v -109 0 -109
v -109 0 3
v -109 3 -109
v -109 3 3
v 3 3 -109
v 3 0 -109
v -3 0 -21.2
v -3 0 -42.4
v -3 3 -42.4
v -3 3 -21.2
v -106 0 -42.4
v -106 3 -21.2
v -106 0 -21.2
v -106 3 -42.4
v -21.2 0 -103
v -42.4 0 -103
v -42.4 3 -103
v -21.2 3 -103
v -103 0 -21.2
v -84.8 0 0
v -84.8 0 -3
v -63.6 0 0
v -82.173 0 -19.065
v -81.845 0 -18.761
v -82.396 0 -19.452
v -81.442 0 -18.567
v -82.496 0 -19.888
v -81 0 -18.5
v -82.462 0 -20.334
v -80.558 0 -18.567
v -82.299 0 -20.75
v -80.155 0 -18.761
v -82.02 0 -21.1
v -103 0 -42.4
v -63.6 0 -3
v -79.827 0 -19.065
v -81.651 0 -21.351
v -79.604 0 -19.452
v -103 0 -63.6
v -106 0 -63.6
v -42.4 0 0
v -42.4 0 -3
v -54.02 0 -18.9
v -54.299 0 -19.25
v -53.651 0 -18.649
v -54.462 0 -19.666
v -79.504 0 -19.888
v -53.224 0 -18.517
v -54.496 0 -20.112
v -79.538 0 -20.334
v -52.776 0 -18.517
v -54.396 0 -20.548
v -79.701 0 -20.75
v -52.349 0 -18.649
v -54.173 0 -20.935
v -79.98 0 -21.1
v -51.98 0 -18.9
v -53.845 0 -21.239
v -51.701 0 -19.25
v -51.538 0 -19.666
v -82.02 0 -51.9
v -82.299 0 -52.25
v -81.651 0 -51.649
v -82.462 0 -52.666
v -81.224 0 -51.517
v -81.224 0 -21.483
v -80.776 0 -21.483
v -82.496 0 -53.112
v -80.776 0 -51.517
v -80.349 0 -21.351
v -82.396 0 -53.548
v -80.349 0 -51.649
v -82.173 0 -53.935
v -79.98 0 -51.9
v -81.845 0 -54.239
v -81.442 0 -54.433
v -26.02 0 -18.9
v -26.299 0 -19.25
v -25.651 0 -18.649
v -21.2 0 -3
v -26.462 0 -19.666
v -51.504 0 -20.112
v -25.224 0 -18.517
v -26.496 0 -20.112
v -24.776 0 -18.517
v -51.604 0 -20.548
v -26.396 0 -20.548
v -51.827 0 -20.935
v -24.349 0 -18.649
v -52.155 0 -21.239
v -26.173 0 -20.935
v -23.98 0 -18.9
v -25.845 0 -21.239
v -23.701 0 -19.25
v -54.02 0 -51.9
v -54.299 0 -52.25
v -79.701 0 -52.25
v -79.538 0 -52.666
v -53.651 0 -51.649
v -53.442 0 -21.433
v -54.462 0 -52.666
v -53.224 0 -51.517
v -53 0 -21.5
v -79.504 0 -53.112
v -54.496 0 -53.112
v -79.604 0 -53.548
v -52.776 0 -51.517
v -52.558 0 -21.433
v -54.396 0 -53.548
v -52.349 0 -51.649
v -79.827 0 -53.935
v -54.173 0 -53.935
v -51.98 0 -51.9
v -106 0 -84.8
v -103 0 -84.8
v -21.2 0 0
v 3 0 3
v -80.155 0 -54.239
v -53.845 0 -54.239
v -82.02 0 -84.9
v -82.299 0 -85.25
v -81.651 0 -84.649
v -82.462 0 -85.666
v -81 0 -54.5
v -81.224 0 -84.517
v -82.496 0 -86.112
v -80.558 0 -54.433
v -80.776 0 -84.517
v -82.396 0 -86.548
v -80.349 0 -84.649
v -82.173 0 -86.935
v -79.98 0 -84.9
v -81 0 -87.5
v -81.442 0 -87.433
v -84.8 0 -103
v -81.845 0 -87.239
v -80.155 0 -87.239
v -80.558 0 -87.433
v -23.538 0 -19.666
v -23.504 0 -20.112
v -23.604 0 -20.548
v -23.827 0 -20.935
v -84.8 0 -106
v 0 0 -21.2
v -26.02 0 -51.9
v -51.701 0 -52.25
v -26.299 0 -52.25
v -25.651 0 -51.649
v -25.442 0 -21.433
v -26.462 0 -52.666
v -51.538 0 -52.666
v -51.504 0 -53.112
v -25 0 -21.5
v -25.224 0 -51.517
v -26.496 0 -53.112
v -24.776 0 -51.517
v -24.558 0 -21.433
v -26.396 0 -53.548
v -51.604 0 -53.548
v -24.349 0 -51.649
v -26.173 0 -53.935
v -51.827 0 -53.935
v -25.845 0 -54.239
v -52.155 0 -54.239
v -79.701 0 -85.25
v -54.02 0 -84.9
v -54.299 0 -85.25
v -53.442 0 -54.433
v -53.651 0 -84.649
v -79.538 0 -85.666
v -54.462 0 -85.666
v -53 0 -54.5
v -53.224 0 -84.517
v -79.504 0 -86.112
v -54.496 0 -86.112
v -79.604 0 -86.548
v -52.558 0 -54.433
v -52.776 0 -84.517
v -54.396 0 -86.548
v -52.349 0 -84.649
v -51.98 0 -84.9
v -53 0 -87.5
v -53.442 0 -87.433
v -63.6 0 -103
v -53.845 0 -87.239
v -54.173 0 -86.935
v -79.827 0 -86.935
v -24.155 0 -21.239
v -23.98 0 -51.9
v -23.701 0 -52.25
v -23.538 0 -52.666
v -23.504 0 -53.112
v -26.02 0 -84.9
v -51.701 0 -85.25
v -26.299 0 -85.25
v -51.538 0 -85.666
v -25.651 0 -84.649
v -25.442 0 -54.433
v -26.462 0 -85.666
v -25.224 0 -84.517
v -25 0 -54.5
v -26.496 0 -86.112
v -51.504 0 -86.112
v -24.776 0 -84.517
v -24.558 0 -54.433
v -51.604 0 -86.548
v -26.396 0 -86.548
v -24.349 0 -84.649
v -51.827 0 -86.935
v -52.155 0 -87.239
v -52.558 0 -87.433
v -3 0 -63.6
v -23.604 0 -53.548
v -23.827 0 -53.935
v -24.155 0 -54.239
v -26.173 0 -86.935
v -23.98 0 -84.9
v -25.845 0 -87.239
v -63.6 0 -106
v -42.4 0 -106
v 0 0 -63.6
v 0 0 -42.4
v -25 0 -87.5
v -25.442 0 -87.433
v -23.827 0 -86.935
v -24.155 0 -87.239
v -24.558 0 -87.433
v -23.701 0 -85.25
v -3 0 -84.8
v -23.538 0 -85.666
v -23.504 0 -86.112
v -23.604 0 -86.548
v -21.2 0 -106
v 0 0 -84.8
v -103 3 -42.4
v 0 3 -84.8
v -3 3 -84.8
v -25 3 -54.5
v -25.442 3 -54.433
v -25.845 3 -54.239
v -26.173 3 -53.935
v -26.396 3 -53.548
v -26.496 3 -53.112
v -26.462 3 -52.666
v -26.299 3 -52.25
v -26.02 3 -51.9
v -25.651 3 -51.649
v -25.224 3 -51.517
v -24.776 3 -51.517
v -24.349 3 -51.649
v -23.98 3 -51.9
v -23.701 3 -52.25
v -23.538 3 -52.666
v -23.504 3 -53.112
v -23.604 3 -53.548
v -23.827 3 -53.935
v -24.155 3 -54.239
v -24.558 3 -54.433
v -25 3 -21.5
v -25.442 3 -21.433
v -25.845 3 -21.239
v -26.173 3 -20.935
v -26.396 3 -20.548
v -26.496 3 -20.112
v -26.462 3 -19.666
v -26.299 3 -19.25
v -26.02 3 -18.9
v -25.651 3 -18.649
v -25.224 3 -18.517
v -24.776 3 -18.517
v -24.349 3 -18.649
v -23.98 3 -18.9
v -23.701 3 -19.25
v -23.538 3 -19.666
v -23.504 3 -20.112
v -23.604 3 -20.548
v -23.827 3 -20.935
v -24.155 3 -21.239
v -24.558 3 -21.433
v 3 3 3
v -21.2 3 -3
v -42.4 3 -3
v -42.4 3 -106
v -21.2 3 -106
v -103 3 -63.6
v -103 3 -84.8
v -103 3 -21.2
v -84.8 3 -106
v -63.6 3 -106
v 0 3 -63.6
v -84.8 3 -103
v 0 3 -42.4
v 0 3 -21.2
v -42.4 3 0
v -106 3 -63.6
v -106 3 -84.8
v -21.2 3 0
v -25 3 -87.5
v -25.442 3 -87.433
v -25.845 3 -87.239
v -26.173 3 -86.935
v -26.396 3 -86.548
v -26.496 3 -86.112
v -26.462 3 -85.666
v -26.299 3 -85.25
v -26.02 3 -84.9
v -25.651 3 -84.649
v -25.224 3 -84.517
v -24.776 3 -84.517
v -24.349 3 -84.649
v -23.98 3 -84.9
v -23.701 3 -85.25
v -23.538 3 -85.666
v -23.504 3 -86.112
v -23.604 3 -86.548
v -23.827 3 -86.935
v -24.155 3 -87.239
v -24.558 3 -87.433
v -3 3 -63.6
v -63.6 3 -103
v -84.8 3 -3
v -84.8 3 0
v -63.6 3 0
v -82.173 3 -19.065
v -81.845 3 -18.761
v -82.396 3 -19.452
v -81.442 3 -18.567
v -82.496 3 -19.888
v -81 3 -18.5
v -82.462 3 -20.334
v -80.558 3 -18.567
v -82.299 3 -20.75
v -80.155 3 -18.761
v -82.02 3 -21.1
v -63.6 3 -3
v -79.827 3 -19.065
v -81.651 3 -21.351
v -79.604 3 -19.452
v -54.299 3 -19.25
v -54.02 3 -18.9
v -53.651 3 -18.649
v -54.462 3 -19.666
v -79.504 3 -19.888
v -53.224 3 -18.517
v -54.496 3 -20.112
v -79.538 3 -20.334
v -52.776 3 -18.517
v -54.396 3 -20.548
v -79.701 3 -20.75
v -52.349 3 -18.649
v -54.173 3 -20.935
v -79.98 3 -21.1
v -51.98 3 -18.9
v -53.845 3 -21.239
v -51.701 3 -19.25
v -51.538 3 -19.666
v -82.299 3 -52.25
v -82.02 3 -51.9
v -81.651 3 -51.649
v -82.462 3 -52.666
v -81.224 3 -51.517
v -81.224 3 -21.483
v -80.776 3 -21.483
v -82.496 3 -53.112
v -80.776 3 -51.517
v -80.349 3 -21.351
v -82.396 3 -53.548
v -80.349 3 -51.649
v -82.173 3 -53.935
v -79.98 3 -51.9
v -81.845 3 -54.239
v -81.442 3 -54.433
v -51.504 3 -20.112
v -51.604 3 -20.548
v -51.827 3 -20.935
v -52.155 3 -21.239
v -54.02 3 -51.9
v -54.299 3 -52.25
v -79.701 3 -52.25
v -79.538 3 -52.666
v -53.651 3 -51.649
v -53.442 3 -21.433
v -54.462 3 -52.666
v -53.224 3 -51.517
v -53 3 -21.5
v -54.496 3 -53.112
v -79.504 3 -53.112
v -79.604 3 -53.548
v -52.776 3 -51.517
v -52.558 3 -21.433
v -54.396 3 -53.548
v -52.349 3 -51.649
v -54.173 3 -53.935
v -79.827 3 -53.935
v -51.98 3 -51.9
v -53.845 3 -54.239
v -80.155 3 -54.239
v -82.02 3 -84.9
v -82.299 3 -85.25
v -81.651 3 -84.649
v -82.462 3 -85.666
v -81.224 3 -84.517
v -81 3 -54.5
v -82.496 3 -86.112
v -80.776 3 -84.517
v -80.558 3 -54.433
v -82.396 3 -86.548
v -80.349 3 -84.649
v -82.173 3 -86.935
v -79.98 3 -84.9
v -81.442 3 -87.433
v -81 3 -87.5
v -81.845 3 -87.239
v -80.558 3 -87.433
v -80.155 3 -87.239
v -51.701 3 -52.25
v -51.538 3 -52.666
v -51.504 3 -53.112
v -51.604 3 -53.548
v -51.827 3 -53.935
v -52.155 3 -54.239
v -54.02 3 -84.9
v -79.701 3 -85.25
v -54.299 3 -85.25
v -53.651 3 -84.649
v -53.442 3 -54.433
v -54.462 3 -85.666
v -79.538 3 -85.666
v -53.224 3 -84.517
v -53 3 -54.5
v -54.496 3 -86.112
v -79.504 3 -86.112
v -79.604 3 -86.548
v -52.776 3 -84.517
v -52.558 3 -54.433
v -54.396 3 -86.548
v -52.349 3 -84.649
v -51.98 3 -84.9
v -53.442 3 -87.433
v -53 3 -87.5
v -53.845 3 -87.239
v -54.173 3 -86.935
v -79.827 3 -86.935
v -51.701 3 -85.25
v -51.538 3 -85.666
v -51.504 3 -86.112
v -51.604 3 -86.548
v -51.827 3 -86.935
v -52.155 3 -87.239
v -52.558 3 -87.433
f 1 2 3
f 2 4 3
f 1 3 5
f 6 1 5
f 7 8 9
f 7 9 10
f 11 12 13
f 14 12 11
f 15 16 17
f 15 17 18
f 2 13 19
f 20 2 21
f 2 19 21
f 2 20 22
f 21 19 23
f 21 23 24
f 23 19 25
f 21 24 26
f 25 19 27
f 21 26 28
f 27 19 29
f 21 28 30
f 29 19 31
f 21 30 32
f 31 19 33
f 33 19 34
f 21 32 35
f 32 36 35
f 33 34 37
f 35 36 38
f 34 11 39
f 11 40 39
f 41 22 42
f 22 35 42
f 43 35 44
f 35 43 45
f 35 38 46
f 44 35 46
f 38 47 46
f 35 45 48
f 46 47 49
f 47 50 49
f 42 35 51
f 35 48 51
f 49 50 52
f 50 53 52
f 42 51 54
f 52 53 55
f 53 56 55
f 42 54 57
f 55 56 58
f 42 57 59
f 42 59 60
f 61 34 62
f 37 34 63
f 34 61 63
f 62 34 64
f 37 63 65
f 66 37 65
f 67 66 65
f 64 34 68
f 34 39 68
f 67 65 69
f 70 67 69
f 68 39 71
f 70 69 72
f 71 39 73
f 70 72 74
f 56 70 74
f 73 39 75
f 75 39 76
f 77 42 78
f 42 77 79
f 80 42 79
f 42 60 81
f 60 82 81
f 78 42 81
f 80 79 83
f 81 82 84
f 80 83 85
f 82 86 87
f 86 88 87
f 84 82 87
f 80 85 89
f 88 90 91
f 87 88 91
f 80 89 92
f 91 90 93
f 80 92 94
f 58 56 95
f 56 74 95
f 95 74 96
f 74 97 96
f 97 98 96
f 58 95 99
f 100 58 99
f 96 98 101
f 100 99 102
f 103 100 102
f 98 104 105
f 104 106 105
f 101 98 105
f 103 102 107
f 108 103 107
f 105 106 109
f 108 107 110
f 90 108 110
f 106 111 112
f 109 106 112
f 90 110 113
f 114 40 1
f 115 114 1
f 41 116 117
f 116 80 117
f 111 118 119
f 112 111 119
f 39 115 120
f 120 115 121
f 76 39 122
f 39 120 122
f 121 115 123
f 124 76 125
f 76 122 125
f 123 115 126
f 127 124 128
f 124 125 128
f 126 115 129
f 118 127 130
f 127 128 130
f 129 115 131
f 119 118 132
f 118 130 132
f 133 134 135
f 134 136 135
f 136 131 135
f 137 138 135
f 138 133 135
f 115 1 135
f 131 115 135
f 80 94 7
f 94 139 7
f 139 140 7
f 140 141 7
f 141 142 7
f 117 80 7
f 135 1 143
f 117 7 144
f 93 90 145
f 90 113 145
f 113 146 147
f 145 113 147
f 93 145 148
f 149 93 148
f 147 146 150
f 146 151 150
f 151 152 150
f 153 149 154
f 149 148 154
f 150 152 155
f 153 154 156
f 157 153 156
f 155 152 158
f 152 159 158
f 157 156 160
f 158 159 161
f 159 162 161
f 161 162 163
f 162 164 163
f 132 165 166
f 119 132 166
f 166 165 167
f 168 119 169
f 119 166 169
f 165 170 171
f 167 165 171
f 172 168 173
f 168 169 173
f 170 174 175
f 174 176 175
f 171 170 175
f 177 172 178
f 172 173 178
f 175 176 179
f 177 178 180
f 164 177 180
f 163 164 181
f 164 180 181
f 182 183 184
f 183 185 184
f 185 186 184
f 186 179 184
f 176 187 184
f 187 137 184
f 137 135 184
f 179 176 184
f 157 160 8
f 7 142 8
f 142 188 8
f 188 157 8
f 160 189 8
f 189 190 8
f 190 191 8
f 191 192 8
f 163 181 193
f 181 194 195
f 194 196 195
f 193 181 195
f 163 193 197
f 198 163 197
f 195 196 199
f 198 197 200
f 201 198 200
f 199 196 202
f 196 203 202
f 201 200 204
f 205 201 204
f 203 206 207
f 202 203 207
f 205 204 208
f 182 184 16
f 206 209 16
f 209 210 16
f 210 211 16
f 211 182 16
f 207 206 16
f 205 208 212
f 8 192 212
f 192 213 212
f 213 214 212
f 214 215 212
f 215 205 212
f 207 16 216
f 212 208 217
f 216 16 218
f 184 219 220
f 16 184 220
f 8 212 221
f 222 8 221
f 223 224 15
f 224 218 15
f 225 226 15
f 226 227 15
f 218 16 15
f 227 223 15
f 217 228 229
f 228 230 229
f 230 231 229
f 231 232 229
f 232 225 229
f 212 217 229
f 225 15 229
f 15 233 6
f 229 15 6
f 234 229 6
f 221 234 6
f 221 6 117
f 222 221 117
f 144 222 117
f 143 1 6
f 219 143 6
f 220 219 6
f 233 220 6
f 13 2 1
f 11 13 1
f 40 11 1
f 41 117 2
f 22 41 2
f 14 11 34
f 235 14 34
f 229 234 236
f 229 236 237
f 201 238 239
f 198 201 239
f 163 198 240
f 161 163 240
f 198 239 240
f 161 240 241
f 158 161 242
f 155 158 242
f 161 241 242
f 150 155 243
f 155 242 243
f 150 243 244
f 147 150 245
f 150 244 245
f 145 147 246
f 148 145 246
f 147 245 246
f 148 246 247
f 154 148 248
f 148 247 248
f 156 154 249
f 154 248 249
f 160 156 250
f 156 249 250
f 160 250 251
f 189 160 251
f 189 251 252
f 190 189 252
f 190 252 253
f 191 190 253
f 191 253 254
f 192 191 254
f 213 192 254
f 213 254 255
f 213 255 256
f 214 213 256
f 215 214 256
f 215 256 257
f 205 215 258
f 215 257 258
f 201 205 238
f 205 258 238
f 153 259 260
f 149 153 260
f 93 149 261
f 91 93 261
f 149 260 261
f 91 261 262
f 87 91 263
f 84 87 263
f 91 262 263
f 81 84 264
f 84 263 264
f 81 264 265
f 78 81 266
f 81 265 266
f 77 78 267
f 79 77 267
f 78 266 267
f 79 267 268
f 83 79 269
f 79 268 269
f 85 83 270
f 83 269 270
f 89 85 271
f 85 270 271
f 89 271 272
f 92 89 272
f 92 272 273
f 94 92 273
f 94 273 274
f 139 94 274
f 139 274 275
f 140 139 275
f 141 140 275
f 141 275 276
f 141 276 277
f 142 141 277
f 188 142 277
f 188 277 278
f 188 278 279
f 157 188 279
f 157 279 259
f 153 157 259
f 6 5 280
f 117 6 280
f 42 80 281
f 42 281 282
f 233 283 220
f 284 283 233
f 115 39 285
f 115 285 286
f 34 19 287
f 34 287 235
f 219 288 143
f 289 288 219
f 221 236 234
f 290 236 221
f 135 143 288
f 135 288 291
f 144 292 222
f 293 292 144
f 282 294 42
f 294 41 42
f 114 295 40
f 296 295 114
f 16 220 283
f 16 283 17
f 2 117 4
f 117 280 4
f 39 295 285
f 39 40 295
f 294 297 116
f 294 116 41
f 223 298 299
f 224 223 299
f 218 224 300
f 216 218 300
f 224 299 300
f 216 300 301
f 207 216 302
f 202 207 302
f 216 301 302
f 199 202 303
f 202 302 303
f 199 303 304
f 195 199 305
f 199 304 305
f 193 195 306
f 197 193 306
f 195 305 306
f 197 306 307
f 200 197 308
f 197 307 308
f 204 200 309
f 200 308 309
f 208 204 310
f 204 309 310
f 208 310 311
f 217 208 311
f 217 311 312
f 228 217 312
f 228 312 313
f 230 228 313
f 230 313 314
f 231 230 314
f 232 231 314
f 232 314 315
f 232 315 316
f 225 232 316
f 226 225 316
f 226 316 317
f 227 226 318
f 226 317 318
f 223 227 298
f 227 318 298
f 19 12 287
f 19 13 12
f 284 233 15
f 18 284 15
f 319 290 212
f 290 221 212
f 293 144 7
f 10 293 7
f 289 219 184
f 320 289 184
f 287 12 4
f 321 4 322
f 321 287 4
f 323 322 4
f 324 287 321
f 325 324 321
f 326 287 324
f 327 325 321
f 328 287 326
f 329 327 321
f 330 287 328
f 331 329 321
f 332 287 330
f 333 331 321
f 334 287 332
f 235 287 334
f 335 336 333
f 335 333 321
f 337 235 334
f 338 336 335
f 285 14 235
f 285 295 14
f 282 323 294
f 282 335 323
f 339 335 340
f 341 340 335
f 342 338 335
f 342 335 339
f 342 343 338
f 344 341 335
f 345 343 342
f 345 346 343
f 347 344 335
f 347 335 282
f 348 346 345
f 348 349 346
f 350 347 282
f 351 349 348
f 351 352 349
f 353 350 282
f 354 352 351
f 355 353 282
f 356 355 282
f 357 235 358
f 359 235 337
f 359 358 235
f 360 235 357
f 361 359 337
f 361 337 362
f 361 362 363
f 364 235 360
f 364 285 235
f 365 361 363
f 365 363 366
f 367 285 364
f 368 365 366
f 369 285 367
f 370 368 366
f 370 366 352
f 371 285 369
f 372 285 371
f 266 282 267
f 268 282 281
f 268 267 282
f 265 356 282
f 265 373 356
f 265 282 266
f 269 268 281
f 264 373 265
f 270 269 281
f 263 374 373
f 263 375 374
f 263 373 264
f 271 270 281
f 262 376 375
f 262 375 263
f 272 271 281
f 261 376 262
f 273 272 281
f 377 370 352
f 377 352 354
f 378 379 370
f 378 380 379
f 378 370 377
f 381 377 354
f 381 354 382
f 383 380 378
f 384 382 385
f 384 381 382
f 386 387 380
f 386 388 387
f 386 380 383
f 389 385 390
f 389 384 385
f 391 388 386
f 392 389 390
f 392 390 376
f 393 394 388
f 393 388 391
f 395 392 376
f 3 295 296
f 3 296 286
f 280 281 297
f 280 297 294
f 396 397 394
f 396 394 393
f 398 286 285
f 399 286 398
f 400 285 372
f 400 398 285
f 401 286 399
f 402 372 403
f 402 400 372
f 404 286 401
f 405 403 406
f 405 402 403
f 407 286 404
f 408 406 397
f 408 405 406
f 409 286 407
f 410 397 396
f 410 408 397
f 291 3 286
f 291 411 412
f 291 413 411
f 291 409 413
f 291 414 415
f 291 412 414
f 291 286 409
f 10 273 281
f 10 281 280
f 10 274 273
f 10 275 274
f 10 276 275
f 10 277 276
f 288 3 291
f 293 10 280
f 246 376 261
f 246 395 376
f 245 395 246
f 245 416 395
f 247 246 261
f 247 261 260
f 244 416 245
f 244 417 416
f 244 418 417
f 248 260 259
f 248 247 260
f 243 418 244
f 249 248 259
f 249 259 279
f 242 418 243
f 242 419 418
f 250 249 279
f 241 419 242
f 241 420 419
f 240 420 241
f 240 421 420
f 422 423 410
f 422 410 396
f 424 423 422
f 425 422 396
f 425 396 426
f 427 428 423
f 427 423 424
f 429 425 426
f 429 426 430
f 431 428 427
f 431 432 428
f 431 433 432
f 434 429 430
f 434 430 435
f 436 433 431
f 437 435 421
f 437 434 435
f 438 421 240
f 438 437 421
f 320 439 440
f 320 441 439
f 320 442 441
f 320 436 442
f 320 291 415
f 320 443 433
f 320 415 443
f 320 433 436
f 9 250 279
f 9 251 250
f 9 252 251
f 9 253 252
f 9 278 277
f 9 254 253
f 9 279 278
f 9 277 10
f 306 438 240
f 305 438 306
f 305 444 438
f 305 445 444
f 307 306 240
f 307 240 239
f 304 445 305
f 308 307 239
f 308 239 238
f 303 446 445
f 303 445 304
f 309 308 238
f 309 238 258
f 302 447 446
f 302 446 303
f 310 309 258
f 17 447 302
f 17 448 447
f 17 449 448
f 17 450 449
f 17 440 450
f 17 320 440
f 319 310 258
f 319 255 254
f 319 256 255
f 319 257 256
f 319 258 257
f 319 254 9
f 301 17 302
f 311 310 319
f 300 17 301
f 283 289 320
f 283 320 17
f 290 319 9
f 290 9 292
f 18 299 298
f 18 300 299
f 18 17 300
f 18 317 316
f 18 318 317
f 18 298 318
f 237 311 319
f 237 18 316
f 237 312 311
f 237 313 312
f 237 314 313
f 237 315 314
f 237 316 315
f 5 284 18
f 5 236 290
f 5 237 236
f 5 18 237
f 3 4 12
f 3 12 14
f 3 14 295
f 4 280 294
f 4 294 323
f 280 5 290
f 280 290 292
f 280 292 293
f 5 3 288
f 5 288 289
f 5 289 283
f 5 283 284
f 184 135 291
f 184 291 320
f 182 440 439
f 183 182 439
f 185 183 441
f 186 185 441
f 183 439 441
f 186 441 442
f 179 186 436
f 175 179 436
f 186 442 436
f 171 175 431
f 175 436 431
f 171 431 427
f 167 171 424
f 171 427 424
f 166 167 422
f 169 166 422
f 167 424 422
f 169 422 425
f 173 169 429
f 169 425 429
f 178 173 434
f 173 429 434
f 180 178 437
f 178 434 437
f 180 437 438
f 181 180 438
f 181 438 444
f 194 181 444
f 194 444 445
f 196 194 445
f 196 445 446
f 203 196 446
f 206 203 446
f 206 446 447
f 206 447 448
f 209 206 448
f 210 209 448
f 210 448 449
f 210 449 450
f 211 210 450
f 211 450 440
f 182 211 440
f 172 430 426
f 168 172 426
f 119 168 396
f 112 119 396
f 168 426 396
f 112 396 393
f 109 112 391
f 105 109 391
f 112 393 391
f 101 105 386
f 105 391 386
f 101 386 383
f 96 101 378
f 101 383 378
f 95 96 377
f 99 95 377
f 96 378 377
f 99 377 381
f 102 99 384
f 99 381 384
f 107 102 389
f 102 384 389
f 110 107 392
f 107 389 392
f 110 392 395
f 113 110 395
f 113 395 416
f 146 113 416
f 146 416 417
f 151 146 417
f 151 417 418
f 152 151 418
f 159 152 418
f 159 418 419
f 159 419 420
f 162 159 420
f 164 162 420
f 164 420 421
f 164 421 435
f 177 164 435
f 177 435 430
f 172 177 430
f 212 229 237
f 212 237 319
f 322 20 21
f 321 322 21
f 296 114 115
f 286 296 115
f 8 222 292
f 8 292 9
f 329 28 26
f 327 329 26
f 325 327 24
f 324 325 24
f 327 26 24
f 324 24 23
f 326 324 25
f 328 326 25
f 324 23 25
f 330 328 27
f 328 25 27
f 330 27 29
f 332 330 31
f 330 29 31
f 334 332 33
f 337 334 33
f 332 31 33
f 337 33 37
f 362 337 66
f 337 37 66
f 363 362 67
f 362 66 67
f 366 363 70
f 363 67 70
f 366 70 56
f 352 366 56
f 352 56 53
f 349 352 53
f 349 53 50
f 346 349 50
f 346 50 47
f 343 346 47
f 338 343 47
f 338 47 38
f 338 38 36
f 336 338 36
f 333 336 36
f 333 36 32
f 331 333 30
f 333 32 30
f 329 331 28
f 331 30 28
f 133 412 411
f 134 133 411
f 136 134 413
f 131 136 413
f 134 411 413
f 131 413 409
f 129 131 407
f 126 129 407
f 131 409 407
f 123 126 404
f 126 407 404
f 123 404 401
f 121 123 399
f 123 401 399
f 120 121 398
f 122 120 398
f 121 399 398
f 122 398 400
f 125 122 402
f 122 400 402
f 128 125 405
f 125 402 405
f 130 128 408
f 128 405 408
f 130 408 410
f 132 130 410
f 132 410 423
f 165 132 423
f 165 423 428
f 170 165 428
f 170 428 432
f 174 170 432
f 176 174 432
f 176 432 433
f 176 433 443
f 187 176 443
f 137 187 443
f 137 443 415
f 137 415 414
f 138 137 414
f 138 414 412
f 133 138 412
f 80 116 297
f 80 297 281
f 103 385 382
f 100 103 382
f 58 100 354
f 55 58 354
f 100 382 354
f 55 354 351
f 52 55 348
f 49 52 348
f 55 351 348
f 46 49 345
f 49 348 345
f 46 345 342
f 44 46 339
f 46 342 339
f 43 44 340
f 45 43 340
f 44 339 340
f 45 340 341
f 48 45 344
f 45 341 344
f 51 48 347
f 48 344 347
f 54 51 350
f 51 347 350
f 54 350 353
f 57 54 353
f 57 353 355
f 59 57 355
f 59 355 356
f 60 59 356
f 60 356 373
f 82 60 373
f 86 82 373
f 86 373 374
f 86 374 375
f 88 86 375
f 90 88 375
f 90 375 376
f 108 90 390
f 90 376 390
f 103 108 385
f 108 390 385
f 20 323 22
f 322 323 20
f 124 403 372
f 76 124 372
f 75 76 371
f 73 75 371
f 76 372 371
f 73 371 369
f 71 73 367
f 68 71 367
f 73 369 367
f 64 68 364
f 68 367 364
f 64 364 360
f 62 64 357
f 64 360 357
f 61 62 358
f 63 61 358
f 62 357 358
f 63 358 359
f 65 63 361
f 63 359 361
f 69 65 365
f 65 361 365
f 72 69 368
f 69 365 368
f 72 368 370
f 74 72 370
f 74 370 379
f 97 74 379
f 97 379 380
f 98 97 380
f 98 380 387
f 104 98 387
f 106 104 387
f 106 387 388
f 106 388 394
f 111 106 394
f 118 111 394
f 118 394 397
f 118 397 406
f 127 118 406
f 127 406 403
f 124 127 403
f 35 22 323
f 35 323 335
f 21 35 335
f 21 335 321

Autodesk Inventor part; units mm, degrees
ref_plane "YZ Plane" through (0, 0, 0) normal (1, 0, 0) x (0, 1, 0)
ref_plane "XZ Plane" through (0, 0, 0) normal (0, 1, 0) x (-1, 0, 0)
ref_plane "XY Plane" through (0, 0, 0) normal (0, 0, 1) x (1, 0, 0)
sketch "Sketch1" plane through (0, 0, 0) normal (0, 1, 0) x (-1, 0, 0)
  line L0 (21.2, 0) -> (21.2, -3)
  line L1 (42.4, 0) -> (42.4, -3)
  line L2 (63.6, 0) -> (63.6, -3)
  line L3 (84.8, 0) -> (84.8, -3)
  line L4 (84.8, 0) -> (106, 0)
  line L5 (0, 0) -> (21.2, 0)
  line L6 (42.4, 0) -> (63.6, 0)
  line L7 (21.2, -3) -> (42.4, -3)
  line L8 (63.6, -3) -> (84.8, -3)
  line L9 (106, -21.2) -> (103, -21.2)
  line L10 (106, -42.4) -> (103, -42.4)
  line L11 (106, -63.6) -> (103, -63.6)
  line L12 (106, -84.8) -> (103, -84.8)
  line L13 (106, -84.8) -> (106, -106)
  line L14 (103, -21.2) -> (103, -42.4)
  line L15 (103, -63.6) -> (103, -84.8)
  line L16 (106, 0) -> (106, -21.2)
  line L17 (106, -42.4) -> (106, -63.6)
  line L18 (0, -21.2) -> (3, -21.2)
  line L19 (0, -42.4) -> (3, -42.4)
  line L20 (0, -63.6) -> (3, -63.6)
  line L21 (0, -84.8) -> (3, -84.8)
  line L22 (0, -21.2) -> (0, 0)
  line L23 (3, -84.8) -> (3, -63.6)
  line L24 (3, -42.4) -> (3, -21.2)
  line L25 (0, -106) -> (0, -84.8)
  line L26 (0, -63.6) -> (0, -42.4)
  line L27 (21.2, -106) -> (21.2, -103)
  line L28 (42.4, -106) -> (42.4, -103)
  line L29 (63.6, -106) -> (63.6, -103)
  line L30 (84.8, -106) -> (84.8, -103)
  line L31 (21.2, -106) -> (0, -106)
  line L32 (84.8, -103) -> (63.6, -103)
  line L33 (42.4, -103) -> (21.2, -103)
  line L34 (106, -106) -> (84.8, -106)
  line L35 (63.6, -106) -> (42.4, -106)
  dimension "d0" = 106
  dimension "d1" = 106
extrude "Extrusion1" add sketch "Sketch1" along normal blind 3
sketch "Sketch2" plane through (0, 3, 0) normal (0, 1, 0) x (1, 0, 0)
  circle A0 centre (-25, 20) radius 0.5
  circle A1 centre (-53, 20) radius 0.5
  circle A2 centre (-81, 20) radius 0.5
  circle A3 centre (-81, 53) radius 0.5
  circle A4 centre (-81, 86) radius 0.5
  circle A5 centre (-53, 53) radius 0.5
  circle A6 centre (-53, 86) radius 0.5
  circle A7 centre (-25, 53) radius 0.5
  circle A8 centre (-25, 86) radius 0.5
  point P0 (0, 0)
  dimension "d6" = 1
  dimension "d7" = 1
  dimension "d8" = 1
  dimension "d9" = 1
  dimension "d10" = 1
  dimension "d11" = 1
  dimension "d12" = 1
  dimension "d13" = 1
  dimension "d14" = 1
hole "Hole1" at (-81, 3, -20) direction (0, -1, 0) diameter 3 end through all
sketch "Sketch3" plane through (0, 3, 0) normal (0, 1, 0) x (1, 0, 0)
  line L0 (-21.2, 0) -> (0, 0) projected
  line L1 (0, 0) -> (-106, 0)
  line L2 (-106, 0) -> (-106, 106)
  line L3 (-106, 106) -> (0, 106)
  line L4 (0, 106) -> (0, 0)
  line L5 (3, -3) -> (-109, -3)
  line L6 (-109, -3) -> (-109, 109)
  line L7 (-109, 109) -> (3, 109)
  line L8 (3, 109) -> (3, -3)
  dimension "d22" = 112
  dimension "d23" = 112
extrude "Extrusion2" add sketch "Sketch3" against normal blind 3
sketch "Sketch5" plane through (0, 0, 0) normal (0, -1, 0) x (1, 0, 0)
  circle A0 centre (-25, -20) radius 1.5
  point P0 (0, 0)
  dimension "d26" = 3
hole "Hole2" at (-25, 0, -20) direction (0, 1, 0) diameter 3 end through all
sketch "Sketch6" plane through (0, 0, 0) normal (0, -1, 0) x (1, 0, 0)
  circle A0 centre (-25, -53) radius 1.5
  point P0 (0, 0)
  dimension "d34" = 3
hole "Hole3" at (-25, 0, -53) direction (0, 1, 0) diameter 3 end through all
sketch "Sketch7" plane through (0, 0, 0) normal (0, -1, 0) x (1, 0, 0)
  circle A0 centre (-53, -20) radius 1.5
  point P0 (0, 0)
  dimension "d42" = 3
hole "Hole4" at (-53, 0, -20) direction (0, 1, 0) diameter 3 end through all
sketch "Sketch8" plane through (0, 0, 0) normal (0, -1, 0) x (1, 0, 0)
  circle A0 centre (-53, -53) radius 1.5
  point P0 (0, 0)
  dimension "d50" = 3
hole "Hole5" at (-53, 0, -53) direction (0, 1, 0) diameter 3 end through all
sketch "Sketch9" plane through (0, 0, 0) normal (0, -1, 0) x (1, 0, 0)
  circle A0 centre (-25, -86) radius 1.5
  point P0 (0, 0)
  dimension "d58" = 3
hole "Hole6" at (-25, 0, -86) direction (0, 1, 0) diameter 3 end through all
sketch "Sketch10" plane through (0, 0, 0) normal (0, -1, 0) x (1, 0, 0)
  circle A0 centre (-53, -86) radius 1.5
  point P0 (0, 0)
  dimension "d66" = 3
hole "Hole7" at (-53, 0, -86) direction (0, 1, 0) diameter 3 end through all
sketch "Sketch11" plane through (0, 0, 0) normal (0, -1, 0) x (1, 0, 0)
  circle A0 centre (-81, -53) radius 1.5
  point P0 (0, 0)
  dimension "d74" = 3
hole "Hole8" at (-81, 0, -53) direction (0, 1, 0) diameter 3 end through all
sketch "Sketch12" plane through (0, 0, 0) normal (0, -1, 0) x (1, 0, 0)
  circle A0 centre (-81, -86) radius 1.5
  point P0 (0, 0)
  dimension "d82" = 3
hole "Hole9" at (-81, 0, -86) direction (0, 1, 0) diameter 3 end through all
properties part number "Box top" material "PMMA Plastic"
